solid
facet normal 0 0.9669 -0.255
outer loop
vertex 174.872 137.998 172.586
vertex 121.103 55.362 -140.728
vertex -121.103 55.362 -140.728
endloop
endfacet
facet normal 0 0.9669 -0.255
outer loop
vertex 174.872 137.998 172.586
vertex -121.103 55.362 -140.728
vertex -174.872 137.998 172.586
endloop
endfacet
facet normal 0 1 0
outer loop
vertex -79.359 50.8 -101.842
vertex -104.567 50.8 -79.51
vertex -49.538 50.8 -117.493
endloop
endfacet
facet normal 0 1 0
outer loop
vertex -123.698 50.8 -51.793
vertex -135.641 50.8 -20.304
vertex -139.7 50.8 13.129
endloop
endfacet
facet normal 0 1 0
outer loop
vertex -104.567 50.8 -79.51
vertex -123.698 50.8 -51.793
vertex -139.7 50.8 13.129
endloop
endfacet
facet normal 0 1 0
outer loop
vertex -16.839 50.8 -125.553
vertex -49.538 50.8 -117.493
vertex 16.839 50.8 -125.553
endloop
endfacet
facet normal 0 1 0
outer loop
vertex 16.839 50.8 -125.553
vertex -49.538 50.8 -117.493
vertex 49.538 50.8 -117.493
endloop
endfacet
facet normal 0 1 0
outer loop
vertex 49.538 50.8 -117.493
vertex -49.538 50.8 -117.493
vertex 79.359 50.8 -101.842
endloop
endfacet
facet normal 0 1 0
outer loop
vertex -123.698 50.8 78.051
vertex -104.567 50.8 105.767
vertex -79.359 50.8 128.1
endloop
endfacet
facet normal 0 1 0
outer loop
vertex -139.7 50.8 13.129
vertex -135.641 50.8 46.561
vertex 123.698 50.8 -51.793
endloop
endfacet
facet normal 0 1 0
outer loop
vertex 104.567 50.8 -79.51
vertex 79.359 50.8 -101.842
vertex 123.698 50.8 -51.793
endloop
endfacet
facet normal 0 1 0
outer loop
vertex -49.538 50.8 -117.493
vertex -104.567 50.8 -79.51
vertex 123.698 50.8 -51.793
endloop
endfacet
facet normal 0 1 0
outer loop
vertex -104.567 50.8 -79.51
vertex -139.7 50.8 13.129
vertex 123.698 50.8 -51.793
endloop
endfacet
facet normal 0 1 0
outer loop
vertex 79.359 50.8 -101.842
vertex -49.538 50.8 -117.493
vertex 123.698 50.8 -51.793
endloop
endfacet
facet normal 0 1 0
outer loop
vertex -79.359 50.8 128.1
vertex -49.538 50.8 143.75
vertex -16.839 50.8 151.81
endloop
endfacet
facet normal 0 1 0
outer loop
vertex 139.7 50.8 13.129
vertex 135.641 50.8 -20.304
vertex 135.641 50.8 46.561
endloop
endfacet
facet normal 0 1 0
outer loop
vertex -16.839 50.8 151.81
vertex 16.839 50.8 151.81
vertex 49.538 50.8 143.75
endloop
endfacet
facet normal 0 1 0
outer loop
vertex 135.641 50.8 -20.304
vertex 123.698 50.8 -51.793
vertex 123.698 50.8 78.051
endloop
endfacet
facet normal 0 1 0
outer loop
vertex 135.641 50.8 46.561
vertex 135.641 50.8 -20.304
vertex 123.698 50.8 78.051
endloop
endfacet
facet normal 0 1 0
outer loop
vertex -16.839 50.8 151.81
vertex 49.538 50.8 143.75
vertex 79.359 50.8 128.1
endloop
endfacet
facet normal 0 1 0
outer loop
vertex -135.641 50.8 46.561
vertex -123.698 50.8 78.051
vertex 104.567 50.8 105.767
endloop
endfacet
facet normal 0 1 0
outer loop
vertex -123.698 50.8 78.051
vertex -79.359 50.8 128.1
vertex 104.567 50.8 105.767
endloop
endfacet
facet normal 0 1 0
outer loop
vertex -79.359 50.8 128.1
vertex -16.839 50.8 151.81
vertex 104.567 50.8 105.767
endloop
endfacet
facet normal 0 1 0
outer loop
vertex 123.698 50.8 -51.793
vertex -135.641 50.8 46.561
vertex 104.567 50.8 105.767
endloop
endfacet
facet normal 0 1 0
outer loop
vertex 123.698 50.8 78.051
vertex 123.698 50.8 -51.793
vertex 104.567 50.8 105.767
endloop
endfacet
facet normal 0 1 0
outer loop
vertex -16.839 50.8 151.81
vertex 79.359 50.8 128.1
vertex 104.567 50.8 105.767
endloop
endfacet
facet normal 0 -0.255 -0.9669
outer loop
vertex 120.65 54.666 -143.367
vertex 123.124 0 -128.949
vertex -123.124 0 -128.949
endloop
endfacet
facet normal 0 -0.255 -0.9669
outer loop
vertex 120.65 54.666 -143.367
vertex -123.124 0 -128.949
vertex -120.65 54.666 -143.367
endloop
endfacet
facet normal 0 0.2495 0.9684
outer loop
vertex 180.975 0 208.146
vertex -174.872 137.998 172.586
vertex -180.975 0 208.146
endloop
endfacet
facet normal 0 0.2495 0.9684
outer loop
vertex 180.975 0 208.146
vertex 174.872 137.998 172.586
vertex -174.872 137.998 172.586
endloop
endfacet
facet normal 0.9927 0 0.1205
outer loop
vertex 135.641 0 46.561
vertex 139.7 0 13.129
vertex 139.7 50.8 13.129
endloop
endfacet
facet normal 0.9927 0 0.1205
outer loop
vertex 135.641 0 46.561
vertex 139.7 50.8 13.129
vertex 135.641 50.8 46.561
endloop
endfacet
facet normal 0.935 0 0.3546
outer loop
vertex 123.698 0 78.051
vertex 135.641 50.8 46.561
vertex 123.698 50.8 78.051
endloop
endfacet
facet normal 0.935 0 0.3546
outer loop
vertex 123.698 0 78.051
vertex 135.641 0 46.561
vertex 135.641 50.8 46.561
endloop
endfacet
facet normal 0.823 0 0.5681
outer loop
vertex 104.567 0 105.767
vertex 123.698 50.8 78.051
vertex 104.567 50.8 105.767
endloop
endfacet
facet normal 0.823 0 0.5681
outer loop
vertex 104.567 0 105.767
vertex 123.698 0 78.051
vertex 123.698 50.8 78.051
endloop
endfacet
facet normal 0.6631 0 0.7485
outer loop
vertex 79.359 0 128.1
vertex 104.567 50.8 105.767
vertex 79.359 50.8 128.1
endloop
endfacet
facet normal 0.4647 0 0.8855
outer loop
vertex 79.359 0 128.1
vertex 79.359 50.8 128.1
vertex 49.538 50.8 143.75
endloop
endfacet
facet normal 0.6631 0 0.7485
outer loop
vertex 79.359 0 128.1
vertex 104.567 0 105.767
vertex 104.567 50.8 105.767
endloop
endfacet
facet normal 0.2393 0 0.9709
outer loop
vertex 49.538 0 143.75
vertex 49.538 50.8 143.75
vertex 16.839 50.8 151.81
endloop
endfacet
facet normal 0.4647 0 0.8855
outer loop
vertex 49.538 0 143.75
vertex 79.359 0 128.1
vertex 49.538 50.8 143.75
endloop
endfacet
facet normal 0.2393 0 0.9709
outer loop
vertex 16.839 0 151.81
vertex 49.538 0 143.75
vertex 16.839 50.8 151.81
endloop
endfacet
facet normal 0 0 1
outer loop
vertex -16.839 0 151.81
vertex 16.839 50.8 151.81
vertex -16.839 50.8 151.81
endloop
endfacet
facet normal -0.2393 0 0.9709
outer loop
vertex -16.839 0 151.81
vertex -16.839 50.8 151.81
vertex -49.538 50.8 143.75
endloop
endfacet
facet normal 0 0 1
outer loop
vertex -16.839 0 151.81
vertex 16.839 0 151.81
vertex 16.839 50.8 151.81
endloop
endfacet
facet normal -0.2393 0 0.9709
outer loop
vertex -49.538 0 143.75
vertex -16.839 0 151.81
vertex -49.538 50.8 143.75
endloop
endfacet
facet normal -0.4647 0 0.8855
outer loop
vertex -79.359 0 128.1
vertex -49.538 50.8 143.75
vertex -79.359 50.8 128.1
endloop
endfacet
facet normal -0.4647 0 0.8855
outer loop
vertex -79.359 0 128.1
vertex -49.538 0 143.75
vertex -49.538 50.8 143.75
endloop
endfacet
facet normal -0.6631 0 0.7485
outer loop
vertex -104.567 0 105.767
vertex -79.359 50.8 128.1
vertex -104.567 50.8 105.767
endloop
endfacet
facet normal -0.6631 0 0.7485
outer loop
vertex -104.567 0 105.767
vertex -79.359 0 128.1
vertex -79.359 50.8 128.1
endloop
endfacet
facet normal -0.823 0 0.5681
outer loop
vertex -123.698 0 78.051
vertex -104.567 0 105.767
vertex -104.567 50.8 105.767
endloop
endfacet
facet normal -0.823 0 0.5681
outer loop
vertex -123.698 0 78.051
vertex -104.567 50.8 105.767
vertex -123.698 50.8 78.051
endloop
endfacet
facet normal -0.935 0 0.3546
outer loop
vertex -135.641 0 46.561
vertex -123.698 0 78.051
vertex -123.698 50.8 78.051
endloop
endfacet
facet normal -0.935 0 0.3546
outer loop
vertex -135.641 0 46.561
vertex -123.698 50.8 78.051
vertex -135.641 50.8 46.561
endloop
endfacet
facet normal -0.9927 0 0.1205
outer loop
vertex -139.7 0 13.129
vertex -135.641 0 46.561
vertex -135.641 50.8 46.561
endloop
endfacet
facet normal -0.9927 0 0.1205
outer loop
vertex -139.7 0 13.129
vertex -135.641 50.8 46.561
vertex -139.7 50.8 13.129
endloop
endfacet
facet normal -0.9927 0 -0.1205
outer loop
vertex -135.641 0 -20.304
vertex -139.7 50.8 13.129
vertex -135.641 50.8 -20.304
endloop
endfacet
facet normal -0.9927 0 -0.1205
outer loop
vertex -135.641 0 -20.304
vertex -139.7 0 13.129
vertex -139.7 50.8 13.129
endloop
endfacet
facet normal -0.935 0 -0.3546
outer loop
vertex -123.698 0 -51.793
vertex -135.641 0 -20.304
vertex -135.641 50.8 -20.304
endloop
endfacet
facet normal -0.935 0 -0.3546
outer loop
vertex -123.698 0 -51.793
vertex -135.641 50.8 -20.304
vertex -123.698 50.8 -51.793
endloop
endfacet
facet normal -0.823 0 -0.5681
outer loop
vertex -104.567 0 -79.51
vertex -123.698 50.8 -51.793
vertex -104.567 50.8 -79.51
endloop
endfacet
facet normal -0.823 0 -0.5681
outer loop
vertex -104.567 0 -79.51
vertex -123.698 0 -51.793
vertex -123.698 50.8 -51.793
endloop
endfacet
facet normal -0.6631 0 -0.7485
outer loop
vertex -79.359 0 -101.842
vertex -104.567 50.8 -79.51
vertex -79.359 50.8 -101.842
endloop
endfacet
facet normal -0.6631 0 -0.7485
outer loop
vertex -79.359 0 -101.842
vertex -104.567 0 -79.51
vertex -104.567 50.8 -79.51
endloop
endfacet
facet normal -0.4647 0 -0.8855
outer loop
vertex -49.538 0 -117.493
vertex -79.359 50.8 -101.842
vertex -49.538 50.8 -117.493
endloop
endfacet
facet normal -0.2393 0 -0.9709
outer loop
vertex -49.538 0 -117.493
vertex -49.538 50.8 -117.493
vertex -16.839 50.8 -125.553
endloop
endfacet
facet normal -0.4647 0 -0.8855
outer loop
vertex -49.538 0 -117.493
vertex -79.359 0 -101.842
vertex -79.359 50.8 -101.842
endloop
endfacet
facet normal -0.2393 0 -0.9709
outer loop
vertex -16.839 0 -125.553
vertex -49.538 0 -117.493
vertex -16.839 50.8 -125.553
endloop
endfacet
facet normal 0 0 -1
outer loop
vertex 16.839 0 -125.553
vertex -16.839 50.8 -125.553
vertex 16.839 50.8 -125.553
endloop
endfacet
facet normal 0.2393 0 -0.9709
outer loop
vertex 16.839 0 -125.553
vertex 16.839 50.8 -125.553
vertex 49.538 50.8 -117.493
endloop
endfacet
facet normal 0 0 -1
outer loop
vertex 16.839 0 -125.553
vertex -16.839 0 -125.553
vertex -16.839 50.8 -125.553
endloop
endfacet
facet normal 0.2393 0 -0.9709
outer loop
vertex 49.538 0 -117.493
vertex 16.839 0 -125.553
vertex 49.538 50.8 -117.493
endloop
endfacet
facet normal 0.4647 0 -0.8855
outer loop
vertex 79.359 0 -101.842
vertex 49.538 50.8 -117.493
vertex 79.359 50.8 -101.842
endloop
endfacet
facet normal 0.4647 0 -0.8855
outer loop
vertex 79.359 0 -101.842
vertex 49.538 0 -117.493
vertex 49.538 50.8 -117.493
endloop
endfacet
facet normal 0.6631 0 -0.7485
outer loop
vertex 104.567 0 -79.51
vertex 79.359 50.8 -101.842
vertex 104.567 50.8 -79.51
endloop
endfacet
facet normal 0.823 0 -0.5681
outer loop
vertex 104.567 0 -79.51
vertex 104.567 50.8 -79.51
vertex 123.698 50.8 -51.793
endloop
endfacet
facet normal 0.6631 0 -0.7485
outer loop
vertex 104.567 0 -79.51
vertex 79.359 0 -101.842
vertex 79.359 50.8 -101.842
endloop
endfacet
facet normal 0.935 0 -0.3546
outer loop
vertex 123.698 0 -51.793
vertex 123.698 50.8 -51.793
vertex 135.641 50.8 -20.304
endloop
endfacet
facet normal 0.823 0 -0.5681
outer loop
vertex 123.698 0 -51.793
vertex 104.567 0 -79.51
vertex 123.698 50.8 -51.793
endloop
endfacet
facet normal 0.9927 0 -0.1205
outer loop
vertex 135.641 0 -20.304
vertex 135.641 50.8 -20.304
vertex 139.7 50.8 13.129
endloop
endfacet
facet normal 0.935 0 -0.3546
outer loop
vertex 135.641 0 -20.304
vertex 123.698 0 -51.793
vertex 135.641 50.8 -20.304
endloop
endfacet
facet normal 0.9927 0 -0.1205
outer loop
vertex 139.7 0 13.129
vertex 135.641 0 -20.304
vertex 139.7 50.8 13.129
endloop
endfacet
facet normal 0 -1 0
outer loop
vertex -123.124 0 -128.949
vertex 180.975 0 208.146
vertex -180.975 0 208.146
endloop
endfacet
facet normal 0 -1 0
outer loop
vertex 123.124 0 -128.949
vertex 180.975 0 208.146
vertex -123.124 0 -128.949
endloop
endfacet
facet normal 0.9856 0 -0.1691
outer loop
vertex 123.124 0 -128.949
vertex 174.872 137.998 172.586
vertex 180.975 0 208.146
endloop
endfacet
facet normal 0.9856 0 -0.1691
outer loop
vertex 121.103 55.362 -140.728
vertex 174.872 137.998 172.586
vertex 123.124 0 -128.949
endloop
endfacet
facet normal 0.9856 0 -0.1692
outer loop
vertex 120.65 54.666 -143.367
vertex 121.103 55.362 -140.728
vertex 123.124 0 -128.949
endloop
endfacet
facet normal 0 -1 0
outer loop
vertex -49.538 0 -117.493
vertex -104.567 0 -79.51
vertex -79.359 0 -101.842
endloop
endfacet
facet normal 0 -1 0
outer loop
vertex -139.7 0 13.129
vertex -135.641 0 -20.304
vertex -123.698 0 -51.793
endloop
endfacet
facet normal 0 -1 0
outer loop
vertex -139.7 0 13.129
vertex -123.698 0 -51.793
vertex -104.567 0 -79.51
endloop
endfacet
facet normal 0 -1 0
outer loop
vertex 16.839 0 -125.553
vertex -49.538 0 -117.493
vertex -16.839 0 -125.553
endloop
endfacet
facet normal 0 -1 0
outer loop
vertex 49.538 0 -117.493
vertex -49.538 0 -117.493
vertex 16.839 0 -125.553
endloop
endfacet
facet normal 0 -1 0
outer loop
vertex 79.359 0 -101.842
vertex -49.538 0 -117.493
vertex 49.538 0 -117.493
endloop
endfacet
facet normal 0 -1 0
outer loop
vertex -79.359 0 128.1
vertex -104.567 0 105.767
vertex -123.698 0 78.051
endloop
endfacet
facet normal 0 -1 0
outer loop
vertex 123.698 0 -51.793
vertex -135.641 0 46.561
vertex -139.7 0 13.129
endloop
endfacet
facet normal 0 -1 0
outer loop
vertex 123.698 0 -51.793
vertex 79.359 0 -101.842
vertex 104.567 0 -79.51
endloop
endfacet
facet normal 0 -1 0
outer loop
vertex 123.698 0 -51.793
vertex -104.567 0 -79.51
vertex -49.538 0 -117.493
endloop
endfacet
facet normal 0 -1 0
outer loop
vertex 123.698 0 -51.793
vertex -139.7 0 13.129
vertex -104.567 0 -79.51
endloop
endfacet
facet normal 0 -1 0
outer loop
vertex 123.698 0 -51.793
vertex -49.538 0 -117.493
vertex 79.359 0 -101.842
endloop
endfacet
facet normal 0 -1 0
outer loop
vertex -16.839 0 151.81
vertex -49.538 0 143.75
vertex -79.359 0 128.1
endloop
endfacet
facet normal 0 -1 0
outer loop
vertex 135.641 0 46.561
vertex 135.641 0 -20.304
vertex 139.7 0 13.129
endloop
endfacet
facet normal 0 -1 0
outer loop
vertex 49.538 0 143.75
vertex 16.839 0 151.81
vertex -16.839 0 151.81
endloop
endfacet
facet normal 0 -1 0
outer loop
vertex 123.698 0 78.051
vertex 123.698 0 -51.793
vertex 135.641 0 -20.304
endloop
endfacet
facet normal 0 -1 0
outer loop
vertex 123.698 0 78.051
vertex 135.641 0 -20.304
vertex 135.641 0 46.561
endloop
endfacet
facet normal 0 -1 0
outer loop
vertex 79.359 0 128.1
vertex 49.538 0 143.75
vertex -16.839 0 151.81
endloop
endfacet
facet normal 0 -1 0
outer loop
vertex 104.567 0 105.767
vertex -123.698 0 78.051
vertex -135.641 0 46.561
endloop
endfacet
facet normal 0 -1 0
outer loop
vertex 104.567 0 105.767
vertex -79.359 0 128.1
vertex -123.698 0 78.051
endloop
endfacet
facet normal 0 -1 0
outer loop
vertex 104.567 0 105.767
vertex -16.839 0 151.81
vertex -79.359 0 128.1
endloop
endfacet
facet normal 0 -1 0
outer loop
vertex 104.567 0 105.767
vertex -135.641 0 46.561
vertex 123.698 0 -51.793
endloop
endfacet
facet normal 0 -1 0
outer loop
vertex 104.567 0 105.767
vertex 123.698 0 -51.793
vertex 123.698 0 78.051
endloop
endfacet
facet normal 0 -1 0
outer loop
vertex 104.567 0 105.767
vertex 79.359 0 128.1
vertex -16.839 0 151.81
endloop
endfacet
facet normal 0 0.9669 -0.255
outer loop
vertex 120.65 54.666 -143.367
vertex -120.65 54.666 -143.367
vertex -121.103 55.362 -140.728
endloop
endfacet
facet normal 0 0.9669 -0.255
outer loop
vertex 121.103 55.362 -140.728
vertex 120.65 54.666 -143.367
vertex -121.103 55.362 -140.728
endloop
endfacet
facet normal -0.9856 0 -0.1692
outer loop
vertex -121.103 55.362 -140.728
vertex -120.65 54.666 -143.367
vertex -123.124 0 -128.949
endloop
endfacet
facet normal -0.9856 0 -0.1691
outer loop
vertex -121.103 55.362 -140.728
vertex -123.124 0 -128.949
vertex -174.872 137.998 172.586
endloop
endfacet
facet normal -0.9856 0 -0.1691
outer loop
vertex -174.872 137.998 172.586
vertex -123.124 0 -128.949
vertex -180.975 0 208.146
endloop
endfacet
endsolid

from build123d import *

# Parameters (mm, degrees)
F1_DEPTH = 180.975
F4_DEPTH = 152.4
F5_R     = 139.7
F6_DEPTH = 50.8


with BuildPart() as f1:
    # F0 (on Right) → F1 (new body, symmetric)
    with BuildSketch(Plane.YZ):
        Polygon((96.7011995311, 199.1207802254), (-41.2968869365, 234.6810589562), (-41.2968869365, -100.4281210136), (-41.2968869365, -102.4134735519), (13.3691944888, -116.8315782163), (14.0650554855, -114.1932290856), align=None)
    extrude(amount=F1_DEPTH, both=True)


with BuildPart() as f1_1:
    # F2: moved
    add(f1.part.moved(Location((0, 41.2968948, -26.535126))))

    # F3 (on face) → F4 (cut, symmetric)
    with BuildSketch(Plane.XZ.offset(-7.8635e-06)):
        Polygon((180.975, 208.1459329562), (120.65, -143.3667042163), (410.69722442, -143.3667042163), align=None)
        Polygon((-410.69722442, -143.3667042163), (-120.65, -143.3667042163), (-180.975, 208.1459329562), align=None)
    extrude(amount=F4_DEPTH, both=True, mode=Mode.SUBTRACT)


with BuildPart() as f6:
    # F5 (on Front) → F6 (new body)
    with BuildSketch(Plane.XZ):
        with Locations((0, 13.1286960095)):
            Circle(F5_R)
    extrude(amount=-F6_DEPTH)


solid = Compound([f1_1.part, f6.part])
